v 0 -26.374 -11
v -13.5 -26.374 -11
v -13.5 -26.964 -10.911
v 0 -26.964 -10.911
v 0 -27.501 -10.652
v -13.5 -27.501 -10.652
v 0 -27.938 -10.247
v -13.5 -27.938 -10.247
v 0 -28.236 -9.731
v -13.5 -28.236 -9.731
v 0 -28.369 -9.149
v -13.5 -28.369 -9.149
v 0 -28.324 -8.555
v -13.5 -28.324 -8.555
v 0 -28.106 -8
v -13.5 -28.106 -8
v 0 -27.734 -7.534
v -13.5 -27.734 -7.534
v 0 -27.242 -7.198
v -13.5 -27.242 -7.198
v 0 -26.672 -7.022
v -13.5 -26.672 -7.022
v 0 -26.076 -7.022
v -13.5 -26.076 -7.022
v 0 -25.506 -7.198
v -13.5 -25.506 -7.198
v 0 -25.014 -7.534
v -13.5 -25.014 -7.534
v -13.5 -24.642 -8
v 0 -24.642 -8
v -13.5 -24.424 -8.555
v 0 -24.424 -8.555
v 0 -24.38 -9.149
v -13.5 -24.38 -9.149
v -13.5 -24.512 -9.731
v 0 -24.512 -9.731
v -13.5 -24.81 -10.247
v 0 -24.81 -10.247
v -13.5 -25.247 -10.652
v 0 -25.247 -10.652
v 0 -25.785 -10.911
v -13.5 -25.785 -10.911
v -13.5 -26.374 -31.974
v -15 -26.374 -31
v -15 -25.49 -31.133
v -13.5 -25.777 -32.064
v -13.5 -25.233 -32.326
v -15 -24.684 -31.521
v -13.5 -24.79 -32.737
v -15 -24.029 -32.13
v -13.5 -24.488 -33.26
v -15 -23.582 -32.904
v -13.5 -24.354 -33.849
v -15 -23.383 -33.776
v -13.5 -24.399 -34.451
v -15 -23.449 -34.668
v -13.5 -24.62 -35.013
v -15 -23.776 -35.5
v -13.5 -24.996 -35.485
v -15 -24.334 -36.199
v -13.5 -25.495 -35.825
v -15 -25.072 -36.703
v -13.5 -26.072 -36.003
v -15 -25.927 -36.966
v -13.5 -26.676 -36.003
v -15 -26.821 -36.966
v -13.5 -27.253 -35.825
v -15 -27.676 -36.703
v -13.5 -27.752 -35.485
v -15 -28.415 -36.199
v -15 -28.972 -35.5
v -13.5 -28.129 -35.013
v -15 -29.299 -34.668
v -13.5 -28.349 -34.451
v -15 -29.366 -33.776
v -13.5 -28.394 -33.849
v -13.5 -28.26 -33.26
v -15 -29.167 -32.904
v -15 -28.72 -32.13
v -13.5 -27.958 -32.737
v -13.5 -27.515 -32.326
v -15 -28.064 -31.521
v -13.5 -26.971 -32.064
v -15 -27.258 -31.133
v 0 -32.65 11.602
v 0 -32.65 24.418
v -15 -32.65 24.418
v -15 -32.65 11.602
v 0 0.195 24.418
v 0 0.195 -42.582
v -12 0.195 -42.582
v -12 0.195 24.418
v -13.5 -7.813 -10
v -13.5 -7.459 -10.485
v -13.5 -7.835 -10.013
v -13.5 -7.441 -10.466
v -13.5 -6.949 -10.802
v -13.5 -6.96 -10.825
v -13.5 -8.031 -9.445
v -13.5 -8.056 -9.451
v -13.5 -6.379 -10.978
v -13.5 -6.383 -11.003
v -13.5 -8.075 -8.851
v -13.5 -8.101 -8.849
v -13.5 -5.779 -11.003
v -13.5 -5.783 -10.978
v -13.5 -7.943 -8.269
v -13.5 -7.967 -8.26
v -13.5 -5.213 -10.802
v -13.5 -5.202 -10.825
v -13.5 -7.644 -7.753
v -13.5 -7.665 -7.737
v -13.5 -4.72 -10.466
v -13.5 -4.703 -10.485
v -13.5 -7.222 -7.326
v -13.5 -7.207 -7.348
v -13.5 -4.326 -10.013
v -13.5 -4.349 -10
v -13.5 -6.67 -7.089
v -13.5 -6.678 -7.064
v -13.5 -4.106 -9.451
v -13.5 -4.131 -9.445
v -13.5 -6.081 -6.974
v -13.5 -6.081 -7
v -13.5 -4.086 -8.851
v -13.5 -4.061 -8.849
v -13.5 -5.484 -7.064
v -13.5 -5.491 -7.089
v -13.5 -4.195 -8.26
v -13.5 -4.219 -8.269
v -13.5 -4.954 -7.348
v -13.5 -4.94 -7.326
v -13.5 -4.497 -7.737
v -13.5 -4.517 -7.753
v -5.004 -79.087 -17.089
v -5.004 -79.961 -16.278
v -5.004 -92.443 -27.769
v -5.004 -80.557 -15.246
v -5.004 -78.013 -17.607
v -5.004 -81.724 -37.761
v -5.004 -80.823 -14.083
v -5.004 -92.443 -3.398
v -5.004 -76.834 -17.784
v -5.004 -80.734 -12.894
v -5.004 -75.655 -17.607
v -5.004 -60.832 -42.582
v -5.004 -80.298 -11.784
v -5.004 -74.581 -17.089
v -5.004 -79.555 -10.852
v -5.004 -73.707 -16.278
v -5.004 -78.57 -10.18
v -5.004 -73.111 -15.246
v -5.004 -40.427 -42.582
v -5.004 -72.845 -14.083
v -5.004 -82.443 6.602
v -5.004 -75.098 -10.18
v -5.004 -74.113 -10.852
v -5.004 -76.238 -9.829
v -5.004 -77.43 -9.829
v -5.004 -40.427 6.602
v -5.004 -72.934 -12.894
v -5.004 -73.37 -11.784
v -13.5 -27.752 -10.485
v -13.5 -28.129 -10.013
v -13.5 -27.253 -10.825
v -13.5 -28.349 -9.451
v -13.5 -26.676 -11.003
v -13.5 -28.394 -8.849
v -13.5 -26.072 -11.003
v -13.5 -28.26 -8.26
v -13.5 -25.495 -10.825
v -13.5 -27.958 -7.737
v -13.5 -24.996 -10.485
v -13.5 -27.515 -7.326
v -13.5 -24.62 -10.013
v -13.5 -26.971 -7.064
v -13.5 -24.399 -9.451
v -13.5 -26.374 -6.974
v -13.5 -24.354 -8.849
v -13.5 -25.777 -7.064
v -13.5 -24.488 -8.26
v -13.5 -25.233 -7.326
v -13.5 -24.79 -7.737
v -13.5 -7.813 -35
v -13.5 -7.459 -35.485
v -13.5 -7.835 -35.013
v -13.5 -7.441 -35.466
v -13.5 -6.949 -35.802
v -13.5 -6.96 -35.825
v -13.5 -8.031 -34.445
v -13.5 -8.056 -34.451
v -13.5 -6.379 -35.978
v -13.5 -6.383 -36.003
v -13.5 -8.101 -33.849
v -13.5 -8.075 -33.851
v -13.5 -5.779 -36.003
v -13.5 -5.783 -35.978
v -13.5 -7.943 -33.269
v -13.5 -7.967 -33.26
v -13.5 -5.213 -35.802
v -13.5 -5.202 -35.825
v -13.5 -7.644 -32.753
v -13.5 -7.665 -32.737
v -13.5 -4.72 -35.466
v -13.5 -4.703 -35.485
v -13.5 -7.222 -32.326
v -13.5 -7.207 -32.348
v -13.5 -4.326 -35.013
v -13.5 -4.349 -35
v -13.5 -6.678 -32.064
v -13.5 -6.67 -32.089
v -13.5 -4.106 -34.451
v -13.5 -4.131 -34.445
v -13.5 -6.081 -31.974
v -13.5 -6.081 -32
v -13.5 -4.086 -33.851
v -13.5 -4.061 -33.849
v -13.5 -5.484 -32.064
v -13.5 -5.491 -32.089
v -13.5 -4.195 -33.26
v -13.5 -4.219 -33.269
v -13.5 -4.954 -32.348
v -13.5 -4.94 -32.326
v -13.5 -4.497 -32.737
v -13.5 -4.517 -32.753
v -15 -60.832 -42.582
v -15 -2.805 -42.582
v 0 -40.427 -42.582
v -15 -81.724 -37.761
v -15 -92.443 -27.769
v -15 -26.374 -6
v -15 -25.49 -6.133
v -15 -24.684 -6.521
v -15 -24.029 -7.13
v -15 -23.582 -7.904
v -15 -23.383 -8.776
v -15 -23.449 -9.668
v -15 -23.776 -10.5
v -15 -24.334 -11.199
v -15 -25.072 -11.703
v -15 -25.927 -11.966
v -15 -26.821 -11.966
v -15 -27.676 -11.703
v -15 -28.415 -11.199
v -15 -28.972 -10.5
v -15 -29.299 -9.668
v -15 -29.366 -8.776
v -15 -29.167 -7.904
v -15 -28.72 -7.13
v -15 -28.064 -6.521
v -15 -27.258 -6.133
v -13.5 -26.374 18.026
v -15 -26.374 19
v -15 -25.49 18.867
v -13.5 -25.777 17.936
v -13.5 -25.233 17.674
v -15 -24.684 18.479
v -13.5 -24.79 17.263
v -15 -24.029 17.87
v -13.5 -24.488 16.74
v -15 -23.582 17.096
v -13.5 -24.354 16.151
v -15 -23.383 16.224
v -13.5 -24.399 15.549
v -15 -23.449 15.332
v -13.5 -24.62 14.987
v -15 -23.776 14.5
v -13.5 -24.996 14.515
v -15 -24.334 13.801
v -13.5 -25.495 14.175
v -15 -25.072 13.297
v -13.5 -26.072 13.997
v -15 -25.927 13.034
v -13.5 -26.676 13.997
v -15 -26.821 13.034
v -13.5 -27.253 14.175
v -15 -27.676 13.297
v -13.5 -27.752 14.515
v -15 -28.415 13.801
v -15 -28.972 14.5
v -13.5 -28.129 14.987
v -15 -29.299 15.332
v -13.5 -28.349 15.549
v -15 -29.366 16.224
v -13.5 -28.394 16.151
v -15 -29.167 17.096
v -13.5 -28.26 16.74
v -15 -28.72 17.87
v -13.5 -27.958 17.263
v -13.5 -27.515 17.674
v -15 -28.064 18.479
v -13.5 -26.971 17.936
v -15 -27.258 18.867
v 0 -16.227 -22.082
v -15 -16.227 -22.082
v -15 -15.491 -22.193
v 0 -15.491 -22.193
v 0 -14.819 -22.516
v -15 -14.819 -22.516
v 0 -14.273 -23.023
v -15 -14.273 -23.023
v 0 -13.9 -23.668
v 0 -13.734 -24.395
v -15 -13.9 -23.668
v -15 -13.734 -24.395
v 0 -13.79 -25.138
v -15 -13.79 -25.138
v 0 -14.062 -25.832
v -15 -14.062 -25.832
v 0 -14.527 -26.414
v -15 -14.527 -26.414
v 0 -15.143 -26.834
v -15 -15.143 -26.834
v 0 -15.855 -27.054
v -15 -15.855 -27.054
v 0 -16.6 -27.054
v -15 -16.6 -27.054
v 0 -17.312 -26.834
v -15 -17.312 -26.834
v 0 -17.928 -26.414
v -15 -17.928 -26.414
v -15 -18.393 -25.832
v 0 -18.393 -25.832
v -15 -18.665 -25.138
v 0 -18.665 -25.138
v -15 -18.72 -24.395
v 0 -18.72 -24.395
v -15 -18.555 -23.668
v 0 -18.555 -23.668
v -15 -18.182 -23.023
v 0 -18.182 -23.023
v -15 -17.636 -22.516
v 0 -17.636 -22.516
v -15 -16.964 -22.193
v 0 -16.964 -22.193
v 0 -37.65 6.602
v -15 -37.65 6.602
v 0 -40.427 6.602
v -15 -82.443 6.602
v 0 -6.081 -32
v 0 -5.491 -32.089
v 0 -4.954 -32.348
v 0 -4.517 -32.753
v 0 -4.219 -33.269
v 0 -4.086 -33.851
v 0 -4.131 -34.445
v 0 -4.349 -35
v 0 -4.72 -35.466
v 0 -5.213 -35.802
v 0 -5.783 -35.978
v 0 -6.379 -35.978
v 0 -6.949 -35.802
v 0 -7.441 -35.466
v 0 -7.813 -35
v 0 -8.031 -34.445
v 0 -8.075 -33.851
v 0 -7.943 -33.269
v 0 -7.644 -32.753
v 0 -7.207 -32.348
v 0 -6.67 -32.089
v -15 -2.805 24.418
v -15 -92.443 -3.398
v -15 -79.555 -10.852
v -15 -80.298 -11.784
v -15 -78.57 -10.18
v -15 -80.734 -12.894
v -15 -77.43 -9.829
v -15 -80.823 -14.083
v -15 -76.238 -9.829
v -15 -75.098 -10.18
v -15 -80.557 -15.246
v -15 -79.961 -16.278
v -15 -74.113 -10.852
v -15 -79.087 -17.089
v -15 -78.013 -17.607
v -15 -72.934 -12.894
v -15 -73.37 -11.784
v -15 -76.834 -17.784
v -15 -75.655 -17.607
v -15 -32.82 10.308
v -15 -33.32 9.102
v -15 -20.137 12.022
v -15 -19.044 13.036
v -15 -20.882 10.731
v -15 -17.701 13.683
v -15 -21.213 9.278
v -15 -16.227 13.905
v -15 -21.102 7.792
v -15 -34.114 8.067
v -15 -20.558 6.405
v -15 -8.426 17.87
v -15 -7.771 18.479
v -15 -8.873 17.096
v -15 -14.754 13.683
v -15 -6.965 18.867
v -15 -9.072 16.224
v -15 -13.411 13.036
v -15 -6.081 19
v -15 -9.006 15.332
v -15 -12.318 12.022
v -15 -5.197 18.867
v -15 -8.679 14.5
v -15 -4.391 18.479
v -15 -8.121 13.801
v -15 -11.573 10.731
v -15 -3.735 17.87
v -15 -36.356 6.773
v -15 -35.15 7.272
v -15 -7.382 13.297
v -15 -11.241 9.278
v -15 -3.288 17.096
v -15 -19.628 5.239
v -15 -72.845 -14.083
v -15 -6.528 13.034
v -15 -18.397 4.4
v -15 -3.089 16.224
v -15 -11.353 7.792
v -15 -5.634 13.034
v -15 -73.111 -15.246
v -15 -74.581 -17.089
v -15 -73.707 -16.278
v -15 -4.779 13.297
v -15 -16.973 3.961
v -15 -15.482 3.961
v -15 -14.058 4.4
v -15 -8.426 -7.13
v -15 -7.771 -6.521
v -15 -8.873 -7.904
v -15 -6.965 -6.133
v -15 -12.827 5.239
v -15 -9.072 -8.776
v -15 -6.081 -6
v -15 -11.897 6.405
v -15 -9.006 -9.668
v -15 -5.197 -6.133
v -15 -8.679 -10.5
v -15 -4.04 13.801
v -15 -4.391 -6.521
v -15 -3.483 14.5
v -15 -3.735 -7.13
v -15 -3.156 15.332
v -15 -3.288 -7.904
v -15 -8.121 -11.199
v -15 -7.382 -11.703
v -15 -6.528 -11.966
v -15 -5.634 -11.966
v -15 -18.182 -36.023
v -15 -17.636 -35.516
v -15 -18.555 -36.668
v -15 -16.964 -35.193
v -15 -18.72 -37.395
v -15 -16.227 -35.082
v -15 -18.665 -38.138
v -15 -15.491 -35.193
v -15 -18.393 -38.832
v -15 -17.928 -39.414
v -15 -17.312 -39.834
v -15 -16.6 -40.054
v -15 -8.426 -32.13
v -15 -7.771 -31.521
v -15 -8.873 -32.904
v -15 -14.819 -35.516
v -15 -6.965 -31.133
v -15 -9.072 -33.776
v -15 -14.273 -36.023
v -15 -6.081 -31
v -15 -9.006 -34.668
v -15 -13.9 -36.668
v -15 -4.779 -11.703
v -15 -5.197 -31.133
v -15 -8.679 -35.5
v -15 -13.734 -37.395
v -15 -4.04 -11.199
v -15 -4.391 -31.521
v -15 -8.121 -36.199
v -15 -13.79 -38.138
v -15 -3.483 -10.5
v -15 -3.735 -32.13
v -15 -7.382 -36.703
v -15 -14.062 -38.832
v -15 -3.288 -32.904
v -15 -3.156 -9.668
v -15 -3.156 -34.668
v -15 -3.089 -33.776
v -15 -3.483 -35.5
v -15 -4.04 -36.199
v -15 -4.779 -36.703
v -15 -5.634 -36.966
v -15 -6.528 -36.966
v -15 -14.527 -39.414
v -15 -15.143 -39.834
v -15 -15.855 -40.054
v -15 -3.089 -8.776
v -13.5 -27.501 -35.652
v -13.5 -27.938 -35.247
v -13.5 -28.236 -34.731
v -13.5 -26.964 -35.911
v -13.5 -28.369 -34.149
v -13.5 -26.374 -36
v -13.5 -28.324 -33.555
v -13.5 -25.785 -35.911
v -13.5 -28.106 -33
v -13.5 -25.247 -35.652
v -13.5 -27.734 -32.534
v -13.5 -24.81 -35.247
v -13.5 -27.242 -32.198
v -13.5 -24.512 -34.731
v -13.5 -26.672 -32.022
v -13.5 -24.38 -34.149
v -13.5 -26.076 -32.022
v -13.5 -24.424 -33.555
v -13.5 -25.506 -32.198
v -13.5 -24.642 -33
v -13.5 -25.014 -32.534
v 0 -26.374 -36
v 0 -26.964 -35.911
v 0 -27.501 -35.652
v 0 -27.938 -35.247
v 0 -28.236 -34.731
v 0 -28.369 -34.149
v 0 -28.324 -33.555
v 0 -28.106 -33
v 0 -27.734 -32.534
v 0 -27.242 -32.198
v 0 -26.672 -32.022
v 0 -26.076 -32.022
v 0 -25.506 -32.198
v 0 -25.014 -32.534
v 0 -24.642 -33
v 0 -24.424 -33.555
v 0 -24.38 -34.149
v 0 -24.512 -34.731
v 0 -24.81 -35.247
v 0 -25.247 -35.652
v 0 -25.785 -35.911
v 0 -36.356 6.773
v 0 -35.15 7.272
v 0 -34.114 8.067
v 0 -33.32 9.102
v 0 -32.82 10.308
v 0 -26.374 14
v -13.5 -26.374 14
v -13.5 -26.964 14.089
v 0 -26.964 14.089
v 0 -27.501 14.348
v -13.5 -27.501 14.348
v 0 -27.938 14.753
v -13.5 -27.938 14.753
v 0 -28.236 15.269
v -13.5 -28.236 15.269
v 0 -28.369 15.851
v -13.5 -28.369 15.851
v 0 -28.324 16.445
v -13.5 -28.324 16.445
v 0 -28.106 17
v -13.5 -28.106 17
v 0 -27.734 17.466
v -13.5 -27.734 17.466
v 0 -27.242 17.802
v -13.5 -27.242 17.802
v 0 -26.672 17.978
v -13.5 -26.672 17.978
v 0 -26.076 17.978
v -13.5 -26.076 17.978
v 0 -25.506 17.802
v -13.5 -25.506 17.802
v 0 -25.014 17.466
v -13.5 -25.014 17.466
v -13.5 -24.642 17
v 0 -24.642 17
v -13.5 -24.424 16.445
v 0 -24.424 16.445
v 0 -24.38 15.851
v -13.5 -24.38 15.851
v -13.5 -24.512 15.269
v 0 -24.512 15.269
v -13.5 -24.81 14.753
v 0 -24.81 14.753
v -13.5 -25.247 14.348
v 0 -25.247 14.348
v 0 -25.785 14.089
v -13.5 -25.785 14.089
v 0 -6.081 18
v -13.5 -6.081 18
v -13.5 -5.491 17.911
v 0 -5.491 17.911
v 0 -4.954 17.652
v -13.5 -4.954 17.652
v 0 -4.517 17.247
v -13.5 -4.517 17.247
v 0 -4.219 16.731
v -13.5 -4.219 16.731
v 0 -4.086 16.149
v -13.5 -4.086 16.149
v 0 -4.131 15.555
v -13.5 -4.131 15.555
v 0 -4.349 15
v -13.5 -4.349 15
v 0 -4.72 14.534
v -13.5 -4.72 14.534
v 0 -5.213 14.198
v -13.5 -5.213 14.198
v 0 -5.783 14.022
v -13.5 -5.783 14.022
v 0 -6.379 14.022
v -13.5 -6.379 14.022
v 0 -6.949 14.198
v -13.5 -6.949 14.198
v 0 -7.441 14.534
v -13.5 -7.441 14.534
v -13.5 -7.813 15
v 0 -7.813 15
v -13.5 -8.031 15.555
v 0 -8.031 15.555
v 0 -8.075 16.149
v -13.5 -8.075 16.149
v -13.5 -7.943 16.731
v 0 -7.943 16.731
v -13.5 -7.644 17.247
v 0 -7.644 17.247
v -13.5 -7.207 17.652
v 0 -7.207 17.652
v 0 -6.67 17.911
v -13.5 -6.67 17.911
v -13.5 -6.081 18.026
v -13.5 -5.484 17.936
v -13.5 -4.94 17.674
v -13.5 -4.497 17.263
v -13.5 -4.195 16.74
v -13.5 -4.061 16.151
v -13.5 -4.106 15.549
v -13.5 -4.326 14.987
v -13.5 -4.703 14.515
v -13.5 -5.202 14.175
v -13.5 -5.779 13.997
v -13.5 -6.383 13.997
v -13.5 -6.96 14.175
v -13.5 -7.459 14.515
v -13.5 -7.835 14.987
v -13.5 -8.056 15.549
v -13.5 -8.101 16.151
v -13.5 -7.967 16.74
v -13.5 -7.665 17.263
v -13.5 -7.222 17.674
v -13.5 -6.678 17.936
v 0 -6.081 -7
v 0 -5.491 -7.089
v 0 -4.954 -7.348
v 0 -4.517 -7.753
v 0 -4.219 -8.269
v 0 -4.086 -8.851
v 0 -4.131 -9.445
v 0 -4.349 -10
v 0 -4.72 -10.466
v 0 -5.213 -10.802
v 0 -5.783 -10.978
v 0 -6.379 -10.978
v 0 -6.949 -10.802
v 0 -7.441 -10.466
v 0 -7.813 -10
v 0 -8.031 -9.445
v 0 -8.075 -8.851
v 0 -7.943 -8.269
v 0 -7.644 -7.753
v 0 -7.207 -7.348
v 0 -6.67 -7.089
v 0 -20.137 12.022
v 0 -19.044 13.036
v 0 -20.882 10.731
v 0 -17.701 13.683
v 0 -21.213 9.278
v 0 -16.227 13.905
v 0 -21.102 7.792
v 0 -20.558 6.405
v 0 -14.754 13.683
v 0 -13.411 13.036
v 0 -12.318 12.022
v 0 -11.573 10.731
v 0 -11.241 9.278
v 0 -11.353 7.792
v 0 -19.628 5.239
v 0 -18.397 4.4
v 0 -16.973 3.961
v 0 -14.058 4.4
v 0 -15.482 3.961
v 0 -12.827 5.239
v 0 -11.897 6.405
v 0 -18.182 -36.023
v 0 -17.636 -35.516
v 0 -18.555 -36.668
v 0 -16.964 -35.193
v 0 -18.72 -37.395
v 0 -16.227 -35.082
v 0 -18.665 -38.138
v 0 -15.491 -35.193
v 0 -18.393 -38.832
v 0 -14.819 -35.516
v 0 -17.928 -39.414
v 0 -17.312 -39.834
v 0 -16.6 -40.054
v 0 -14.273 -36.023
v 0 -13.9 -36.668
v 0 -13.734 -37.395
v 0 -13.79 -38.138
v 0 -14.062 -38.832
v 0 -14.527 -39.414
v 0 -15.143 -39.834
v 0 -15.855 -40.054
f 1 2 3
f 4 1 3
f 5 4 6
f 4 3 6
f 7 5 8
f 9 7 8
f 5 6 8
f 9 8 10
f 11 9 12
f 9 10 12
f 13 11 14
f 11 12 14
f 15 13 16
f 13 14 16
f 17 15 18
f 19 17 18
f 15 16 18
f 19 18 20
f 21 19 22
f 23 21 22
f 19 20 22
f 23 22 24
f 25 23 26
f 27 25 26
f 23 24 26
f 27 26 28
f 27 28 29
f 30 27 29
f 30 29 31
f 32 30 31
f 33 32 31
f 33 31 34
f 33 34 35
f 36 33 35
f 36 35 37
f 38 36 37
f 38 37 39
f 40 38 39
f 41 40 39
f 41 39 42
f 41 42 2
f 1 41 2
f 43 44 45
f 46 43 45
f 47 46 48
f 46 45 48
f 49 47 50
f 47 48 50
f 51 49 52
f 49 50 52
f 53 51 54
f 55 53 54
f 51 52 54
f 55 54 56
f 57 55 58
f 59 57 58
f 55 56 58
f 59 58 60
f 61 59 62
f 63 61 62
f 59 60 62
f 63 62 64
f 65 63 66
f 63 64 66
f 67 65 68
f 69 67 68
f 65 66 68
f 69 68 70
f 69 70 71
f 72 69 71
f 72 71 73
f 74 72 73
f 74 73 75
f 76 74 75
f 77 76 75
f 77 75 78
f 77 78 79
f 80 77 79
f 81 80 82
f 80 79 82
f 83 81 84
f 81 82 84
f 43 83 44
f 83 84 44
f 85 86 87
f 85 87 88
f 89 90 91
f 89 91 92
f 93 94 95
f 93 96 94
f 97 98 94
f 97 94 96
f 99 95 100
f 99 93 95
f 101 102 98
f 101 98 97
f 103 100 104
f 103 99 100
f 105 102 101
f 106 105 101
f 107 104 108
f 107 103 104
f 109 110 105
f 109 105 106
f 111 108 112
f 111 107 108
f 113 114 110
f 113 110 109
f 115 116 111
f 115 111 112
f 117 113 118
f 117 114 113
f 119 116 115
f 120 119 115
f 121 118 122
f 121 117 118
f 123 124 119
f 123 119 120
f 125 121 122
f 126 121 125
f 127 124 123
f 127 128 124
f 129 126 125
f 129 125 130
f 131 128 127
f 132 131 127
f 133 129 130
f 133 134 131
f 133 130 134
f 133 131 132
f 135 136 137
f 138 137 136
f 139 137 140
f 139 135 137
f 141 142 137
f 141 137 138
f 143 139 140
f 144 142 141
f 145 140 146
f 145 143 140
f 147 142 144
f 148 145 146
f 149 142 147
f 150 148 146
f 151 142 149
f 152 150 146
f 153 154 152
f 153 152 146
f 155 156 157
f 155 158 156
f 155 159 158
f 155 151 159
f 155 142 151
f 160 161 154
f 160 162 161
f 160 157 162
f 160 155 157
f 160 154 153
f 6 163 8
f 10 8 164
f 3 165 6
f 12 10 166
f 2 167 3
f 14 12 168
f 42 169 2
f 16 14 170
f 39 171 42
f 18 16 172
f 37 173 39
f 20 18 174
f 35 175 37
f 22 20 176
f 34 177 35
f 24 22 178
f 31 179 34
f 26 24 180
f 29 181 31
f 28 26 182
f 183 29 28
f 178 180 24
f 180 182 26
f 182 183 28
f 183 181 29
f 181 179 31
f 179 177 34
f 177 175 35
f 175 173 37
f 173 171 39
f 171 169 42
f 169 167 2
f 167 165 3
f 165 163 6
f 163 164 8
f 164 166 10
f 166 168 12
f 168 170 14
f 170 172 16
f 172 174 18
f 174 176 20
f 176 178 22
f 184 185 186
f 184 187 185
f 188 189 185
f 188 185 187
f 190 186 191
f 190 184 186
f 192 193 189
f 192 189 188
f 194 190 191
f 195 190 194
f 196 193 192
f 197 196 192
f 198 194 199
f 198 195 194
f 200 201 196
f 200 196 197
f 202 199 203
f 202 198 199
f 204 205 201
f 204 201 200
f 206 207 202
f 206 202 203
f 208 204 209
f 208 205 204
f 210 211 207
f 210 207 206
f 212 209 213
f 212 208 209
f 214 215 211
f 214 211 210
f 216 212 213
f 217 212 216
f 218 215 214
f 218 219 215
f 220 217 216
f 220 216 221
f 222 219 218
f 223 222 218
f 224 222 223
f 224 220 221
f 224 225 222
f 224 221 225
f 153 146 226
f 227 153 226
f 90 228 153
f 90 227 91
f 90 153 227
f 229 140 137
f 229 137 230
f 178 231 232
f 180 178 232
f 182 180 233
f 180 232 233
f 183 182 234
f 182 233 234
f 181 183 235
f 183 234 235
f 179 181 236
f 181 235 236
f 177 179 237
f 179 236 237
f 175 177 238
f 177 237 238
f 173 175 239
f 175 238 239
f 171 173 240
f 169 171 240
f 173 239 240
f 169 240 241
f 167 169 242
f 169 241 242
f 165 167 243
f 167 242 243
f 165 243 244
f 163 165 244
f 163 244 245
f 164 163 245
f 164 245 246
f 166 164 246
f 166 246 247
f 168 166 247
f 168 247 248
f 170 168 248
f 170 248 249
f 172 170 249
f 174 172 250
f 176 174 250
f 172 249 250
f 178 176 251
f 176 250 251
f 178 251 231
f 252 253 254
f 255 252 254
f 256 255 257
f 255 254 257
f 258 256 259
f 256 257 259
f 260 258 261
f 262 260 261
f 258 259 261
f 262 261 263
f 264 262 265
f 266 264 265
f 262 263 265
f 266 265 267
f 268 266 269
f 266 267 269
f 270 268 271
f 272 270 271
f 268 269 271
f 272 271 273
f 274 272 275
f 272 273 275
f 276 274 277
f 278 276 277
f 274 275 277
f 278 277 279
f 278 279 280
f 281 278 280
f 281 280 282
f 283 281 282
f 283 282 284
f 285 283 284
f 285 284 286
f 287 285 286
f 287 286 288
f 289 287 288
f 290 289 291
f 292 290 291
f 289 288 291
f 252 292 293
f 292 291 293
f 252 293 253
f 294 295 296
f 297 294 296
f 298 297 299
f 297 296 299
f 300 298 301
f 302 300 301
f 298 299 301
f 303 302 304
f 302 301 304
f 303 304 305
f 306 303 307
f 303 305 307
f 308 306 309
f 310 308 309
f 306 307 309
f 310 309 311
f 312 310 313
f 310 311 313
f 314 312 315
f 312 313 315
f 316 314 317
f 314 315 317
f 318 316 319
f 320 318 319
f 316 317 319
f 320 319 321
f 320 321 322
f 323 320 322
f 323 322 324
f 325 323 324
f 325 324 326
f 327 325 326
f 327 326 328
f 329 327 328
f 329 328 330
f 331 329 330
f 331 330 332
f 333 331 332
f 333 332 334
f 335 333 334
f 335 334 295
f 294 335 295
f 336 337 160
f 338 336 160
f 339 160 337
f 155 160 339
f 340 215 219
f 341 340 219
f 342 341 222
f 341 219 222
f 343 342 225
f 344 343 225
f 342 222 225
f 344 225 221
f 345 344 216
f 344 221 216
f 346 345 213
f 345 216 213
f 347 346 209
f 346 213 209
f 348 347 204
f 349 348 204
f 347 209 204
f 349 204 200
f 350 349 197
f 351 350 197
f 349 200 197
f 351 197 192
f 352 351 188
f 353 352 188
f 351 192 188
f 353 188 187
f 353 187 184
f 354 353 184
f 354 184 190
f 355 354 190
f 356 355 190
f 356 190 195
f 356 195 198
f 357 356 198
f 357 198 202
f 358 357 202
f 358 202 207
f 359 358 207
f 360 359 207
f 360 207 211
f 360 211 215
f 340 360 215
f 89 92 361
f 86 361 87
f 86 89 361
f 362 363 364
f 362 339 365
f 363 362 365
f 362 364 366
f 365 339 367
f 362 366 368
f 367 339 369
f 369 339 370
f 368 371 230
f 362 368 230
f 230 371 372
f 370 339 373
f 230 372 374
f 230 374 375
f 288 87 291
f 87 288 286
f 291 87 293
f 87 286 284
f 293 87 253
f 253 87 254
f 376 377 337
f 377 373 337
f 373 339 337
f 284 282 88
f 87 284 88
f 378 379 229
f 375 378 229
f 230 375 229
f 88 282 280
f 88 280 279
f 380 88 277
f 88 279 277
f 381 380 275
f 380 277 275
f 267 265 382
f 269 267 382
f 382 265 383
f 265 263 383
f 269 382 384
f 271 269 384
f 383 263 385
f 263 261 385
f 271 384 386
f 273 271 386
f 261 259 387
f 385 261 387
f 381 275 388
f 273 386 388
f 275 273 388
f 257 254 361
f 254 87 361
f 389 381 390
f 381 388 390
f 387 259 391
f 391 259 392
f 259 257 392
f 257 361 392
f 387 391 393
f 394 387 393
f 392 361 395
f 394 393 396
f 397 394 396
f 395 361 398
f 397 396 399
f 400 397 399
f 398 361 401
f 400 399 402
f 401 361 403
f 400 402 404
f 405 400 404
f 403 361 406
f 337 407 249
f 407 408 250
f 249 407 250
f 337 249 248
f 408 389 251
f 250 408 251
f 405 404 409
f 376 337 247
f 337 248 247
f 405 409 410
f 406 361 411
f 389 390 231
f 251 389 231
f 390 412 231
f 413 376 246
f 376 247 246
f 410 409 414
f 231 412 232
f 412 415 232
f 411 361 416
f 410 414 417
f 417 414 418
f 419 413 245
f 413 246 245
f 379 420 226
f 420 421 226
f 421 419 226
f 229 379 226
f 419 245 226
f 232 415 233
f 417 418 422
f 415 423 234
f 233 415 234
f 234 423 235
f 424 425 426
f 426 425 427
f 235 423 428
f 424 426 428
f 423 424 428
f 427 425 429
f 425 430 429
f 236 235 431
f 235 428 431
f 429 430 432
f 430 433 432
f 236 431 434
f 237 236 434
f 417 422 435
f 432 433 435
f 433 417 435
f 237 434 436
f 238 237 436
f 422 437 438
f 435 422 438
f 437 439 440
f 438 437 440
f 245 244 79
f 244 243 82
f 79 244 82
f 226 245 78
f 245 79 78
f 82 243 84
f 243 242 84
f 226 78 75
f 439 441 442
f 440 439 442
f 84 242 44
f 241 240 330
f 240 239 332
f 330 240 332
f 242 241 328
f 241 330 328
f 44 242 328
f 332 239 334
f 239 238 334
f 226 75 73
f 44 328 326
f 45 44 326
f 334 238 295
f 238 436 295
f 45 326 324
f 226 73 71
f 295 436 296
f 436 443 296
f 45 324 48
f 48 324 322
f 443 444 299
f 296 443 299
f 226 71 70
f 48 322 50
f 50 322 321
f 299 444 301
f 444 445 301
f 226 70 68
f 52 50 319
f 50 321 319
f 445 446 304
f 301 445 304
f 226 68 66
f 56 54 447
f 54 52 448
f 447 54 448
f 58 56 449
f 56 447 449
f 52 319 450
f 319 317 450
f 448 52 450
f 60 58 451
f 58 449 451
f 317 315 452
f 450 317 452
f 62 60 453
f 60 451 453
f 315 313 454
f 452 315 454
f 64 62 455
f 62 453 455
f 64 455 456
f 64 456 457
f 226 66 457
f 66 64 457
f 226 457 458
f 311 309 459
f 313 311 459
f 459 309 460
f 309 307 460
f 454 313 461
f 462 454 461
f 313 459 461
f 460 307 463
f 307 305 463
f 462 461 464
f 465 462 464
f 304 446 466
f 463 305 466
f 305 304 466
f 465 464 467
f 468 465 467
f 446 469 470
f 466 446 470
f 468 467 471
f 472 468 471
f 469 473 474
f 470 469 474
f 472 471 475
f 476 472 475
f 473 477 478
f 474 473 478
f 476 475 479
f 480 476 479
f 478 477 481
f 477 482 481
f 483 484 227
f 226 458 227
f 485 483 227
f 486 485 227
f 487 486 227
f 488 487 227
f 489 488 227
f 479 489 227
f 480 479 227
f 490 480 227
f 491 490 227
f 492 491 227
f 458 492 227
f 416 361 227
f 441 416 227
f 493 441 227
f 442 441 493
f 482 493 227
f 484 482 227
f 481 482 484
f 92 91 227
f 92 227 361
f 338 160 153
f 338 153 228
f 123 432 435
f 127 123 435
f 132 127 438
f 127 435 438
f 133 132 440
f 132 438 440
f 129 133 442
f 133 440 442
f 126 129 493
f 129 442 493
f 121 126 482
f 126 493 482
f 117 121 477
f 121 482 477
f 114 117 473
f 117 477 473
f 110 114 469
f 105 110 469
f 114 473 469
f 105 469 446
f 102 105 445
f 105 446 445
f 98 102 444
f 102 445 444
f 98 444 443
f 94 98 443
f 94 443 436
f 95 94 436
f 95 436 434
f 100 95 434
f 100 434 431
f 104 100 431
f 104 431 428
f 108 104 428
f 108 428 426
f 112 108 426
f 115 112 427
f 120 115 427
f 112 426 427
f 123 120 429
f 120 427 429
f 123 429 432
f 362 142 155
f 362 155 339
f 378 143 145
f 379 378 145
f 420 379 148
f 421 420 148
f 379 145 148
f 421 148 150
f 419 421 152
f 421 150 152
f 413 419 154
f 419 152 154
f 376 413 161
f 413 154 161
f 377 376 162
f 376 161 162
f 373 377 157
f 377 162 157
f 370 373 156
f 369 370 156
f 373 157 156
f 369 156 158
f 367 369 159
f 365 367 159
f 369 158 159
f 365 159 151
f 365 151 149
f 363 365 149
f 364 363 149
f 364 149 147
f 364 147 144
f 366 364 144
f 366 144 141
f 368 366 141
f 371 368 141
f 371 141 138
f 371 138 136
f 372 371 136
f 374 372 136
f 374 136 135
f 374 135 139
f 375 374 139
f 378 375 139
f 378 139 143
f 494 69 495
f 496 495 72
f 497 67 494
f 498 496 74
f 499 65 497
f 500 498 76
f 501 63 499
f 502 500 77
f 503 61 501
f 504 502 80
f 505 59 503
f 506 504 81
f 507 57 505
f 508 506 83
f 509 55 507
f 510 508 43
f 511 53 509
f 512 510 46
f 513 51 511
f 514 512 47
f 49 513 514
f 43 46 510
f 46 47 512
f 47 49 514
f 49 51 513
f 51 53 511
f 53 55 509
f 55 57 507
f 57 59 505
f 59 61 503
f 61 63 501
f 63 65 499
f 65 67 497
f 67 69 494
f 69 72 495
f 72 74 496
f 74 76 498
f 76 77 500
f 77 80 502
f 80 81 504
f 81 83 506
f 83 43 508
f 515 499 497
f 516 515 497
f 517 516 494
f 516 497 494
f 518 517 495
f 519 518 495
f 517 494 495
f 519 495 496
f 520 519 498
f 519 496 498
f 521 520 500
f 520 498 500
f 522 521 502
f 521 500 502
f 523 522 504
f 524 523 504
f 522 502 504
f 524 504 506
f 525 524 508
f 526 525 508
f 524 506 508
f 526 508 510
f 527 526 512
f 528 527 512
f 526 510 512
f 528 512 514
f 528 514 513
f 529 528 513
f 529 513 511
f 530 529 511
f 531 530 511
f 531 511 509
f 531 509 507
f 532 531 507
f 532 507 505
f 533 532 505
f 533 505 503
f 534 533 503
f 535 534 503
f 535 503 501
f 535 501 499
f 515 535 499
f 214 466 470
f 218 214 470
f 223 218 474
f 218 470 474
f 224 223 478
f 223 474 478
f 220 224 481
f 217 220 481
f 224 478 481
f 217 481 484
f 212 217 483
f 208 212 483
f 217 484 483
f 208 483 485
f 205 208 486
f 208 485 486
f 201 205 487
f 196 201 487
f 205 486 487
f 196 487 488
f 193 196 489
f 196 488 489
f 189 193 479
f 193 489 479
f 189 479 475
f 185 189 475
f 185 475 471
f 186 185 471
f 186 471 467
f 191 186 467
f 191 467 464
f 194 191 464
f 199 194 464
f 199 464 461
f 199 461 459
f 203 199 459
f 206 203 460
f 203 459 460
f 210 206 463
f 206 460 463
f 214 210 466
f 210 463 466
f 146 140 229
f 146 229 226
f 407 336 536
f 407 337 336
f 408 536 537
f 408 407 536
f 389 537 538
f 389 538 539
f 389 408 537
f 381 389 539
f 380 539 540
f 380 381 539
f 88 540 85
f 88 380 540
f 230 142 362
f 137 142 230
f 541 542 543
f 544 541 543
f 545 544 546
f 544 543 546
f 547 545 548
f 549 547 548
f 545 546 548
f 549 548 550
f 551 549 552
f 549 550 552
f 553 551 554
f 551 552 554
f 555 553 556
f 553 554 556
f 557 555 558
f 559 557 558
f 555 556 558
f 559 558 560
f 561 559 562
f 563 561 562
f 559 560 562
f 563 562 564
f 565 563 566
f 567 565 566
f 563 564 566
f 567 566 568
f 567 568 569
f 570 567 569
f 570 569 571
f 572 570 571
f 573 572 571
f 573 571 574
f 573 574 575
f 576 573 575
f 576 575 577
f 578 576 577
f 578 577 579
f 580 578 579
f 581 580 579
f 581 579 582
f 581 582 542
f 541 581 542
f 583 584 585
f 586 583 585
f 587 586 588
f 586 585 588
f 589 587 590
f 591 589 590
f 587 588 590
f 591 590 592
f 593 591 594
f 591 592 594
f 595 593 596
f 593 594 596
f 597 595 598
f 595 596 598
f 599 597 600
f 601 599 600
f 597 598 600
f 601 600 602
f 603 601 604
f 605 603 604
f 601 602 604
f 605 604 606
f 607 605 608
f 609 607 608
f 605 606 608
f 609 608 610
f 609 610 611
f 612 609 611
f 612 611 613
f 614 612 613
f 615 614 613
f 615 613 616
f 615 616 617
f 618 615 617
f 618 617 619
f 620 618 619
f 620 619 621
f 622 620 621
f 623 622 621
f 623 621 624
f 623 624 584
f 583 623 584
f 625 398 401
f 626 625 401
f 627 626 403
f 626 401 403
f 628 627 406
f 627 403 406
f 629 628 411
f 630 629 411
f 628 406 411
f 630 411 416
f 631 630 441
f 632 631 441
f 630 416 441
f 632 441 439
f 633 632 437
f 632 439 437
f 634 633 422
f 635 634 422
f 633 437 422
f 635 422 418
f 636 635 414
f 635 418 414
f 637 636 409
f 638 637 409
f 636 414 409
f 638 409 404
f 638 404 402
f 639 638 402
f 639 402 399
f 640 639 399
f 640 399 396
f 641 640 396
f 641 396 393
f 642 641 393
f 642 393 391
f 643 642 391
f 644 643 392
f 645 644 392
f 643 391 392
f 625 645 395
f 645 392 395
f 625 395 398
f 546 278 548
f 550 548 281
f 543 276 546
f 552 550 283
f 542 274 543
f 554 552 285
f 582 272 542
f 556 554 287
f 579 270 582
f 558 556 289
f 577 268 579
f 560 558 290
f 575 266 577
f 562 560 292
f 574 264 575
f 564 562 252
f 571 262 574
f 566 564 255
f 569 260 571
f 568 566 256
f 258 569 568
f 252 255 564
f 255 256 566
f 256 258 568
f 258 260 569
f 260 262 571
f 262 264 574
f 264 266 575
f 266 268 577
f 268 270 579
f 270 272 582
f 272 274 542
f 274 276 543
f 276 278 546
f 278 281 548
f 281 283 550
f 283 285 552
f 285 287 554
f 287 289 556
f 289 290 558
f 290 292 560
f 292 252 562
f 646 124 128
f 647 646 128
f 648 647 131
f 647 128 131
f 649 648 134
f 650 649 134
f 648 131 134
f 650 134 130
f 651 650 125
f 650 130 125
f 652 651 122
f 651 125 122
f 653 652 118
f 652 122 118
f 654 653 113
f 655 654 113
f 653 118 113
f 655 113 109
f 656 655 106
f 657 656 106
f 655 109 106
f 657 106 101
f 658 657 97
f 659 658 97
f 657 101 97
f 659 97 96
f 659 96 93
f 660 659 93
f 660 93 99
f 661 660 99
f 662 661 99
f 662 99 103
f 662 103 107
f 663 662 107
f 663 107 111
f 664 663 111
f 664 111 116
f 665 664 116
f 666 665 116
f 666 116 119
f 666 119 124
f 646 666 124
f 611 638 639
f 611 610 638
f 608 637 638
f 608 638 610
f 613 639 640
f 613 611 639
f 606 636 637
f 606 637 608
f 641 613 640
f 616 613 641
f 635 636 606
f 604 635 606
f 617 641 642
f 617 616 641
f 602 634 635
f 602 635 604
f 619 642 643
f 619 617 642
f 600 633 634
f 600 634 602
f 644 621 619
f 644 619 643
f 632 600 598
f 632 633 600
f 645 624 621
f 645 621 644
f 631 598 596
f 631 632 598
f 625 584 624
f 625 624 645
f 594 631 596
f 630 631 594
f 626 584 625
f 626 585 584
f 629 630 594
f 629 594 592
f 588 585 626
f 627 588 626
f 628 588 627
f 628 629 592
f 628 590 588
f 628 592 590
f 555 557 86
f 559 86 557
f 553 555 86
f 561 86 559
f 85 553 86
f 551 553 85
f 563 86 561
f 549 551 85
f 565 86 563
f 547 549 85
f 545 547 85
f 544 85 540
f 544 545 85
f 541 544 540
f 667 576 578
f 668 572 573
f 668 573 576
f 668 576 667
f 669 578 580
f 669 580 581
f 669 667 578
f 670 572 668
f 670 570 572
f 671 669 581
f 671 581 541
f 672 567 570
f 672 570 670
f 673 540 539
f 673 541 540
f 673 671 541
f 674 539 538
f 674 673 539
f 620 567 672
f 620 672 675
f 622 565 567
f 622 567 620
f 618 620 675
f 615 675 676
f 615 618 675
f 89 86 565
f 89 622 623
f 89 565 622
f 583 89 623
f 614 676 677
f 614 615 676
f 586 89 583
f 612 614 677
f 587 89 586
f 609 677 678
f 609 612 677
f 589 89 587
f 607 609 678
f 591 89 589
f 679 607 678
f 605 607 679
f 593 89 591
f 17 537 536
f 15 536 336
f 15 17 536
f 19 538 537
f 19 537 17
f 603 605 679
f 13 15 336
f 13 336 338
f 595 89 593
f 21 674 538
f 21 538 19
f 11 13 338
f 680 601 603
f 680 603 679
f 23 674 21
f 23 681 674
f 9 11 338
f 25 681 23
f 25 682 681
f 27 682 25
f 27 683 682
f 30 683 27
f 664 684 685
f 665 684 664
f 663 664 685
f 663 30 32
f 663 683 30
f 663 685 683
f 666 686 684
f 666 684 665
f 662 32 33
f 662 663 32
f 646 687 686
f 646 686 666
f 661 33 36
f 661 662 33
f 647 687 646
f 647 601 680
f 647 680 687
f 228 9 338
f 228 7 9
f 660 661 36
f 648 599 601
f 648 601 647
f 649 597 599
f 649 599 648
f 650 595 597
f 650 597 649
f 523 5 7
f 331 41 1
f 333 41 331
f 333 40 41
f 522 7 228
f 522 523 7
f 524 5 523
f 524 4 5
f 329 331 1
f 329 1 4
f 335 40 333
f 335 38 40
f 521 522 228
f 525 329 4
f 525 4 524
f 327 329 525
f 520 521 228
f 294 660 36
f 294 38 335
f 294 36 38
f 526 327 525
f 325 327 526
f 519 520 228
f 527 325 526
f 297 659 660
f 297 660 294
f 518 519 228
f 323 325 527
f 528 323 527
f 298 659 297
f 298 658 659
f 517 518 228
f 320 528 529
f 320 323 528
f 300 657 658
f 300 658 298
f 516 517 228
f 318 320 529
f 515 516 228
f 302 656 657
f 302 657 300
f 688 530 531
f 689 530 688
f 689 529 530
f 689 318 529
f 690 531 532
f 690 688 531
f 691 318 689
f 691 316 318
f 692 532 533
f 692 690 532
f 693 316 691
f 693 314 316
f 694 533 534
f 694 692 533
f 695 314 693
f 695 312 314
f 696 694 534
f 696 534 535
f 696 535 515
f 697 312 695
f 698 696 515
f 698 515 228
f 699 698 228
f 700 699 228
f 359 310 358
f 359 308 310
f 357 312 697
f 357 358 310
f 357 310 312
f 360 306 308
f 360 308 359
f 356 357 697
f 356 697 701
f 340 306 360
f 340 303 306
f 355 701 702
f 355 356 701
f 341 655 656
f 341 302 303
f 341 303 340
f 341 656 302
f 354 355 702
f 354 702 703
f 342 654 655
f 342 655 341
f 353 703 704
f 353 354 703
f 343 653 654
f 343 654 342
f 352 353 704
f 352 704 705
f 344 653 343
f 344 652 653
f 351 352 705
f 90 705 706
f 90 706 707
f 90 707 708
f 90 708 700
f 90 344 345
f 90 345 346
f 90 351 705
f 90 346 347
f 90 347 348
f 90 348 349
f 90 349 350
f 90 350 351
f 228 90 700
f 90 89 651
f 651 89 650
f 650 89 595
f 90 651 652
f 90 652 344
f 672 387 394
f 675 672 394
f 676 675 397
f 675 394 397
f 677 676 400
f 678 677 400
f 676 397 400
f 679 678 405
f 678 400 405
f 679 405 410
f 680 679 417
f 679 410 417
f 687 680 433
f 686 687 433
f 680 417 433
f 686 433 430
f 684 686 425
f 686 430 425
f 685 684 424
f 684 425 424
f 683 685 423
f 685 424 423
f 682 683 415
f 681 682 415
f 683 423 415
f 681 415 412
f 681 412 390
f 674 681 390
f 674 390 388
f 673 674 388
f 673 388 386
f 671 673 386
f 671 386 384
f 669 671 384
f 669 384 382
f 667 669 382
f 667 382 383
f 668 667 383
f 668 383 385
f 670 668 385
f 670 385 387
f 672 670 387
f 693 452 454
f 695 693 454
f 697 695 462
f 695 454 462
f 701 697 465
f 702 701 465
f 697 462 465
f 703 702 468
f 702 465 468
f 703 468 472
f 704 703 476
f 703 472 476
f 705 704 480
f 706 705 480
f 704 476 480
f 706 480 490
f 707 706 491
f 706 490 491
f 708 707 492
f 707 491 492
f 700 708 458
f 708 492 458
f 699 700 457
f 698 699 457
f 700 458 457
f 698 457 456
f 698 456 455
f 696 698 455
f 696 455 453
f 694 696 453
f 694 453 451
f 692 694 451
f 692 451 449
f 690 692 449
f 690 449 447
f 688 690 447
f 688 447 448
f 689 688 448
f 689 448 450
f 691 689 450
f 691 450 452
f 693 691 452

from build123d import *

# Parameters (mm, degrees)
SKETCH_1_R                    = 4
EXTRUDE_1_DEPTH               = 15
SKETCH_2_W                    = 6.467517269
SKETCH_2_H                    = 62.62553055
CUT_EXTRUDE_1_DEPTH           = 55
SKETCH_3_R                    = 5
SKETCH_3_R_2                  = 2.5
CUT_EXTRUDE_2_DEPTH           = 103.877774352
CHAMFER_1_SIZE                = 10
CHAMFER_2_SIZE                = 11
CHAMFER_2_SIZE2               = 7.519269615
FILLET_1_R                    = 5
SKETCH_4_R                    = 2
CUT_EXTRUDE_3_DEPTH           = 103.877774352
SKETCH_5_R                    = 3
CUT_EXTRUDE_4_DEPTH           = 1.5
CUT_EXTRUDE_4_DRAFT           = -33
CUT_EXTRUDE_4_PROFILE_2_DEPTH = 1.5
CUT_EXTRUDE_4_PROFILE_2_DRAFT = -33
CUT_EXTRUDE_4_PROFILE_3_DEPTH = 1.5
CUT_EXTRUDE_4_PROFILE_3_DRAFT = -33
CUT_EXTRUDE_4_PROFILE_4_DEPTH = 1.5
CUT_EXTRUDE_4_PROFILE_4_DRAFT = -33
CUT_EXTRUDE_4_PROFILE_5_DEPTH = 1.5
CUT_EXTRUDE_4_PROFILE_5_DRAFT = -33
CUT_EXTRUDE_4_PROFILE_6_DEPTH = 1.5
CUT_EXTRUDE_4_PROFILE_6_DRAFT = -33
CHAMFER_3_SIZE                = 3


with BuildPart() as part:
    # Эскиз1 → Вытянуть1 (new body)
    with BuildSketch(Plane(origin=(0, 0, 0), x_dir=(0, 0, -1), z_dir=(1, 0, 0))):
        Polygon((-24.418434976, -32.650020726), (-6.60217121, -32.650020726), (-6.60217121, -92.442667507), (35.288487723, -92.442667507), (42.581565024, -60.831663771), (42.581565024, 0.195067042), (-24.418434965, 0.195067042), align=None)
        with Locations((13.784244497, -76.834002497)):
            Circle(SKETCH_1_R, mode=Mode.SUBTRACT)
    extrude(amount=-EXTRUDE_1_DEPTH)

    # Эскиз2 → Вырез-Вытянуть1 (cut, symmetric)
    with BuildSketch(Plane.XY):
        with Locations((-1.770599523, -71.740194192)):
            Rectangle(SKETCH_2_W, SKETCH_2_H)
    extrude(amount=CUT_EXTRUDE_1_DEPTH, both=True, mode=Mode.SUBTRACT)

    # Эскиз3 → Вырез-Вытянуть2 (cut, through all)
    with BuildSketch(Plane.ZY.offset(15)):
        with Locations((8.904690385, -16.227476847)):
            Circle(SKETCH_3_R)
        with Locations((-37.581565054, -16.227476862)):
            Circle(SKETCH_3_R_2)
        with Locations((-24.581565054, -16.227476862)):
            Circle(SKETCH_3_R_2)
    extrude(amount=-CUT_EXTRUDE_2_DEPTH, mode=Mode.SUBTRACT)

    # Фаска1
    chamfer_1_edges = [part.edges().sort_by_distance(p)[0] for p in [
        (-10.002179078, -92.442667507, 6.60217121),
    ]]
    chamfer(chamfer_1_edges, length=CHAMFER_1_SIZE)

    # Фаска2
    chamfer_2_edges = [part.edges().sort_by_distance(p)[0] for p in [
        (-10.002179078, -92.442667507, -35.288487723),
    ]]
    chamfer_2_side = [part.faces().sort_by_distance(p)[0] for p in [
        (-10.002179078, -76.637165639, -38.935026373),
    ]]
    chamfer(chamfer_2_edges, length=CHAMFER_2_SIZE, length2=CHAMFER_2_SIZE2, reference=chamfer_2_side[0])

    # Скругление1
    fillet_1_edges = [part.edges().sort_by_distance(p)[0] for p in [
        (-7.5, -32.650020726, 6.60217121),
    ]]
    fillet(fillet_1_edges, radius=FILLET_1_R)

    # Эскиз4 → Вырез-Вытянуть3 (cut, through all)
    with BuildSketch(Plane.ZY.offset(15)):
        with Locations((-34, -6.080814008)):
            Circle(SKETCH_4_R)
        with Locations((-9, -6.080814008)):
            Circle(SKETCH_4_R)
        with Locations((16, -6.080814008)):
            Circle(SKETCH_4_R)
        with Locations(Location((16, -26.374139717, 0), (0, 0, 180))):
            Circle(SKETCH_4_R)
        with Locations(Location((-9, -26.374139717, 0), (0, 0, 180))):
            Circle(SKETCH_4_R)
        with Locations(Location((-34, -26.374139717, 0), (0, 0, 180))):
            Circle(SKETCH_4_R)
    extrude(amount=-CUT_EXTRUDE_3_DEPTH, mode=Mode.SUBTRACT)


with BuildPart() as cut_extrude_4_tool:
    # Эскиз5 → Вырез-Вытянуть4 (with draft: the straight prism first)
    with BuildSketch(Plane.ZY.offset(15)):
        with Locations((-34, -6.080814008)):
            Circle(SKETCH_5_R)
    extrude(amount=-CUT_EXTRUDE_4_DEPTH)
    # Вырез-Вытянуть4: the draft: its side faces are tilted about the plane it starts from
    cut_extrude_4_sides = [cut_extrude_4_tool.faces().sort_by_distance(p)[0] for p in [
        (-14.25, -6.080814008, -37),
    ]]
    draft(cut_extrude_4_sides, Plane.ZY.offset(15), CUT_EXTRUDE_4_DRAFT)


with BuildPart() as part_1:
    add(part.part)

    # Вырез-Вытянуть4: cut by cut_extrude_4_tool
    add(cut_extrude_4_tool.part, mode=Mode.SUBTRACT)


with BuildPart() as cut_extrude_4_profile_2_tool:
    # Эскиз5 → Вырез-Вытянуть4 profile 2 (with draft: the straight prism first)
    with BuildSketch(Plane.ZY.offset(15)):
        with Locations((-9, -6.080814008)):
            Circle(SKETCH_5_R)
    extrude(amount=-CUT_EXTRUDE_4_PROFILE_2_DEPTH)
    # Вырез-Вытянуть4 profile 2: the draft: its side faces are tilted about the plane it starts from
    cut_extrude_4_profile_2_sides = [cut_extrude_4_profile_2_tool.faces().sort_by_distance(p)[0] for p in [
        (-14.25, -6.080814008, -12),
    ]]
    draft(cut_extrude_4_profile_2_sides, Plane.ZY.offset(15), CUT_EXTRUDE_4_PROFILE_2_DRAFT)


with BuildPart() as part_2:
    add(part_1.part)

    # Вырез-Вытянуть4 profile 2: cut by cut_extrude_4_profile_2_tool
    add(cut_extrude_4_profile_2_tool.part, mode=Mode.SUBTRACT)


with BuildPart() as cut_extrude_4_profile_3_tool:
    # Эскиз5 → Вырез-Вытянуть4 profile 3 (with draft: the straight prism first)
    with BuildSketch(Plane.ZY.offset(15)):
        with Locations((16, -6.080814008)):
            Circle(SKETCH_5_R)
    extrude(amount=-CUT_EXTRUDE_4_PROFILE_3_DEPTH)
    # Вырез-Вытянуть4 profile 3: the draft: its side faces are tilted about the plane it starts from
    cut_extrude_4_profile_3_sides = [cut_extrude_4_profile_3_tool.faces().sort_by_distance(p)[0] for p in [
        (-14.25, -6.080814008, 13),
    ]]
    draft(cut_extrude_4_profile_3_sides, Plane.ZY.offset(15), CUT_EXTRUDE_4_PROFILE_3_DRAFT)


with BuildPart() as part_3:
    add(part_2.part)

    # Вырез-Вытянуть4 profile 3: cut by cut_extrude_4_profile_3_tool
    add(cut_extrude_4_profile_3_tool.part, mode=Mode.SUBTRACT)


with BuildPart() as cut_extrude_4_profile_4_tool:
    # Эскиз5 → Вырез-Вытянуть4 profile 4 (with draft: the straight prism first)
    with BuildSketch(Plane.ZY.offset(15)):
        with Locations((16, -26.374139717)):
            Circle(SKETCH_5_R)
    extrude(amount=-CUT_EXTRUDE_4_PROFILE_4_DEPTH)
    # Вырез-Вытянуть4 profile 4: the draft: its side faces are tilted about the plane it starts from
    cut_extrude_4_profile_4_sides = [cut_extrude_4_profile_4_tool.faces().sort_by_distance(p)[0] for p in [
        (-14.25, -26.374139717, 13),
    ]]
    draft(cut_extrude_4_profile_4_sides, Plane.ZY.offset(15), CUT_EXTRUDE_4_PROFILE_4_DRAFT)


with BuildPart() as part_4:
    add(part_3.part)

    # Вырез-Вытянуть4 profile 4: cut by cut_extrude_4_profile_4_tool
    add(cut_extrude_4_profile_4_tool.part, mode=Mode.SUBTRACT)


with BuildPart() as cut_extrude_4_profile_5_tool:
    # Эскиз5 → Вырез-Вытянуть4 profile 5 (with draft: the straight prism first)
    with BuildSketch(Plane.ZY.offset(15)):
        with Locations((-9, -26.374139717)):
            Circle(SKETCH_5_R)
    extrude(amount=-CUT_EXTRUDE_4_PROFILE_5_DEPTH)
    # Вырез-Вытянуть4 profile 5: the draft: its side faces are tilted about the plane it starts from
    cut_extrude_4_profile_5_sides = [cut_extrude_4_profile_5_tool.faces().sort_by_distance(p)[0] for p in [
        (-14.25, -26.374139717, -12),
    ]]
    draft(cut_extrude_4_profile_5_sides, Plane.ZY.offset(15), CUT_EXTRUDE_4_PROFILE_5_DRAFT)


with BuildPart() as part_5:
    add(part_4.part)

    # Вырез-Вытянуть4 profile 5: cut by cut_extrude_4_profile_5_tool
    add(cut_extrude_4_profile_5_tool.part, mode=Mode.SUBTRACT)


with BuildPart() as cut_extrude_4_profile_6_tool:
    # Эскиз5 → Вырез-Вытянуть4 profile 6 (with draft: the straight prism first)
    with BuildSketch(Plane.ZY.offset(15)):
        with Locations((-34, -26.374139717)):
            Circle(SKETCH_5_R)
    extrude(amount=-CUT_EXTRUDE_4_PROFILE_6_DEPTH)
    # Вырез-Вытянуть4 profile 6: the draft: its side faces are tilted about the plane it starts from
    cut_extrude_4_profile_6_sides = [cut_extrude_4_profile_6_tool.faces().sort_by_distance(p)[0] for p in [
        (-14.25, -26.374139717, -37),
    ]]
    draft(cut_extrude_4_profile_6_sides, Plane.ZY.offset(15), CUT_EXTRUDE_4_PROFILE_6_DRAFT)


with BuildPart() as part_6:
    add(part_5.part)

    # Вырез-Вытянуть4 profile 6: cut by cut_extrude_4_profile_6_tool
    add(cut_extrude_4_profile_6_tool.part, mode=Mode.SUBTRACT)

    # Фаска3
    chamfer_3_edges = [part_6.edges().sort_by_distance(p)[0] for p in [
        (-15, 0.195067042, -9.08156503),
    ]]
    chamfer(chamfer_3_edges, length=CHAMFER_3_SIZE)


solid = part_6.part
